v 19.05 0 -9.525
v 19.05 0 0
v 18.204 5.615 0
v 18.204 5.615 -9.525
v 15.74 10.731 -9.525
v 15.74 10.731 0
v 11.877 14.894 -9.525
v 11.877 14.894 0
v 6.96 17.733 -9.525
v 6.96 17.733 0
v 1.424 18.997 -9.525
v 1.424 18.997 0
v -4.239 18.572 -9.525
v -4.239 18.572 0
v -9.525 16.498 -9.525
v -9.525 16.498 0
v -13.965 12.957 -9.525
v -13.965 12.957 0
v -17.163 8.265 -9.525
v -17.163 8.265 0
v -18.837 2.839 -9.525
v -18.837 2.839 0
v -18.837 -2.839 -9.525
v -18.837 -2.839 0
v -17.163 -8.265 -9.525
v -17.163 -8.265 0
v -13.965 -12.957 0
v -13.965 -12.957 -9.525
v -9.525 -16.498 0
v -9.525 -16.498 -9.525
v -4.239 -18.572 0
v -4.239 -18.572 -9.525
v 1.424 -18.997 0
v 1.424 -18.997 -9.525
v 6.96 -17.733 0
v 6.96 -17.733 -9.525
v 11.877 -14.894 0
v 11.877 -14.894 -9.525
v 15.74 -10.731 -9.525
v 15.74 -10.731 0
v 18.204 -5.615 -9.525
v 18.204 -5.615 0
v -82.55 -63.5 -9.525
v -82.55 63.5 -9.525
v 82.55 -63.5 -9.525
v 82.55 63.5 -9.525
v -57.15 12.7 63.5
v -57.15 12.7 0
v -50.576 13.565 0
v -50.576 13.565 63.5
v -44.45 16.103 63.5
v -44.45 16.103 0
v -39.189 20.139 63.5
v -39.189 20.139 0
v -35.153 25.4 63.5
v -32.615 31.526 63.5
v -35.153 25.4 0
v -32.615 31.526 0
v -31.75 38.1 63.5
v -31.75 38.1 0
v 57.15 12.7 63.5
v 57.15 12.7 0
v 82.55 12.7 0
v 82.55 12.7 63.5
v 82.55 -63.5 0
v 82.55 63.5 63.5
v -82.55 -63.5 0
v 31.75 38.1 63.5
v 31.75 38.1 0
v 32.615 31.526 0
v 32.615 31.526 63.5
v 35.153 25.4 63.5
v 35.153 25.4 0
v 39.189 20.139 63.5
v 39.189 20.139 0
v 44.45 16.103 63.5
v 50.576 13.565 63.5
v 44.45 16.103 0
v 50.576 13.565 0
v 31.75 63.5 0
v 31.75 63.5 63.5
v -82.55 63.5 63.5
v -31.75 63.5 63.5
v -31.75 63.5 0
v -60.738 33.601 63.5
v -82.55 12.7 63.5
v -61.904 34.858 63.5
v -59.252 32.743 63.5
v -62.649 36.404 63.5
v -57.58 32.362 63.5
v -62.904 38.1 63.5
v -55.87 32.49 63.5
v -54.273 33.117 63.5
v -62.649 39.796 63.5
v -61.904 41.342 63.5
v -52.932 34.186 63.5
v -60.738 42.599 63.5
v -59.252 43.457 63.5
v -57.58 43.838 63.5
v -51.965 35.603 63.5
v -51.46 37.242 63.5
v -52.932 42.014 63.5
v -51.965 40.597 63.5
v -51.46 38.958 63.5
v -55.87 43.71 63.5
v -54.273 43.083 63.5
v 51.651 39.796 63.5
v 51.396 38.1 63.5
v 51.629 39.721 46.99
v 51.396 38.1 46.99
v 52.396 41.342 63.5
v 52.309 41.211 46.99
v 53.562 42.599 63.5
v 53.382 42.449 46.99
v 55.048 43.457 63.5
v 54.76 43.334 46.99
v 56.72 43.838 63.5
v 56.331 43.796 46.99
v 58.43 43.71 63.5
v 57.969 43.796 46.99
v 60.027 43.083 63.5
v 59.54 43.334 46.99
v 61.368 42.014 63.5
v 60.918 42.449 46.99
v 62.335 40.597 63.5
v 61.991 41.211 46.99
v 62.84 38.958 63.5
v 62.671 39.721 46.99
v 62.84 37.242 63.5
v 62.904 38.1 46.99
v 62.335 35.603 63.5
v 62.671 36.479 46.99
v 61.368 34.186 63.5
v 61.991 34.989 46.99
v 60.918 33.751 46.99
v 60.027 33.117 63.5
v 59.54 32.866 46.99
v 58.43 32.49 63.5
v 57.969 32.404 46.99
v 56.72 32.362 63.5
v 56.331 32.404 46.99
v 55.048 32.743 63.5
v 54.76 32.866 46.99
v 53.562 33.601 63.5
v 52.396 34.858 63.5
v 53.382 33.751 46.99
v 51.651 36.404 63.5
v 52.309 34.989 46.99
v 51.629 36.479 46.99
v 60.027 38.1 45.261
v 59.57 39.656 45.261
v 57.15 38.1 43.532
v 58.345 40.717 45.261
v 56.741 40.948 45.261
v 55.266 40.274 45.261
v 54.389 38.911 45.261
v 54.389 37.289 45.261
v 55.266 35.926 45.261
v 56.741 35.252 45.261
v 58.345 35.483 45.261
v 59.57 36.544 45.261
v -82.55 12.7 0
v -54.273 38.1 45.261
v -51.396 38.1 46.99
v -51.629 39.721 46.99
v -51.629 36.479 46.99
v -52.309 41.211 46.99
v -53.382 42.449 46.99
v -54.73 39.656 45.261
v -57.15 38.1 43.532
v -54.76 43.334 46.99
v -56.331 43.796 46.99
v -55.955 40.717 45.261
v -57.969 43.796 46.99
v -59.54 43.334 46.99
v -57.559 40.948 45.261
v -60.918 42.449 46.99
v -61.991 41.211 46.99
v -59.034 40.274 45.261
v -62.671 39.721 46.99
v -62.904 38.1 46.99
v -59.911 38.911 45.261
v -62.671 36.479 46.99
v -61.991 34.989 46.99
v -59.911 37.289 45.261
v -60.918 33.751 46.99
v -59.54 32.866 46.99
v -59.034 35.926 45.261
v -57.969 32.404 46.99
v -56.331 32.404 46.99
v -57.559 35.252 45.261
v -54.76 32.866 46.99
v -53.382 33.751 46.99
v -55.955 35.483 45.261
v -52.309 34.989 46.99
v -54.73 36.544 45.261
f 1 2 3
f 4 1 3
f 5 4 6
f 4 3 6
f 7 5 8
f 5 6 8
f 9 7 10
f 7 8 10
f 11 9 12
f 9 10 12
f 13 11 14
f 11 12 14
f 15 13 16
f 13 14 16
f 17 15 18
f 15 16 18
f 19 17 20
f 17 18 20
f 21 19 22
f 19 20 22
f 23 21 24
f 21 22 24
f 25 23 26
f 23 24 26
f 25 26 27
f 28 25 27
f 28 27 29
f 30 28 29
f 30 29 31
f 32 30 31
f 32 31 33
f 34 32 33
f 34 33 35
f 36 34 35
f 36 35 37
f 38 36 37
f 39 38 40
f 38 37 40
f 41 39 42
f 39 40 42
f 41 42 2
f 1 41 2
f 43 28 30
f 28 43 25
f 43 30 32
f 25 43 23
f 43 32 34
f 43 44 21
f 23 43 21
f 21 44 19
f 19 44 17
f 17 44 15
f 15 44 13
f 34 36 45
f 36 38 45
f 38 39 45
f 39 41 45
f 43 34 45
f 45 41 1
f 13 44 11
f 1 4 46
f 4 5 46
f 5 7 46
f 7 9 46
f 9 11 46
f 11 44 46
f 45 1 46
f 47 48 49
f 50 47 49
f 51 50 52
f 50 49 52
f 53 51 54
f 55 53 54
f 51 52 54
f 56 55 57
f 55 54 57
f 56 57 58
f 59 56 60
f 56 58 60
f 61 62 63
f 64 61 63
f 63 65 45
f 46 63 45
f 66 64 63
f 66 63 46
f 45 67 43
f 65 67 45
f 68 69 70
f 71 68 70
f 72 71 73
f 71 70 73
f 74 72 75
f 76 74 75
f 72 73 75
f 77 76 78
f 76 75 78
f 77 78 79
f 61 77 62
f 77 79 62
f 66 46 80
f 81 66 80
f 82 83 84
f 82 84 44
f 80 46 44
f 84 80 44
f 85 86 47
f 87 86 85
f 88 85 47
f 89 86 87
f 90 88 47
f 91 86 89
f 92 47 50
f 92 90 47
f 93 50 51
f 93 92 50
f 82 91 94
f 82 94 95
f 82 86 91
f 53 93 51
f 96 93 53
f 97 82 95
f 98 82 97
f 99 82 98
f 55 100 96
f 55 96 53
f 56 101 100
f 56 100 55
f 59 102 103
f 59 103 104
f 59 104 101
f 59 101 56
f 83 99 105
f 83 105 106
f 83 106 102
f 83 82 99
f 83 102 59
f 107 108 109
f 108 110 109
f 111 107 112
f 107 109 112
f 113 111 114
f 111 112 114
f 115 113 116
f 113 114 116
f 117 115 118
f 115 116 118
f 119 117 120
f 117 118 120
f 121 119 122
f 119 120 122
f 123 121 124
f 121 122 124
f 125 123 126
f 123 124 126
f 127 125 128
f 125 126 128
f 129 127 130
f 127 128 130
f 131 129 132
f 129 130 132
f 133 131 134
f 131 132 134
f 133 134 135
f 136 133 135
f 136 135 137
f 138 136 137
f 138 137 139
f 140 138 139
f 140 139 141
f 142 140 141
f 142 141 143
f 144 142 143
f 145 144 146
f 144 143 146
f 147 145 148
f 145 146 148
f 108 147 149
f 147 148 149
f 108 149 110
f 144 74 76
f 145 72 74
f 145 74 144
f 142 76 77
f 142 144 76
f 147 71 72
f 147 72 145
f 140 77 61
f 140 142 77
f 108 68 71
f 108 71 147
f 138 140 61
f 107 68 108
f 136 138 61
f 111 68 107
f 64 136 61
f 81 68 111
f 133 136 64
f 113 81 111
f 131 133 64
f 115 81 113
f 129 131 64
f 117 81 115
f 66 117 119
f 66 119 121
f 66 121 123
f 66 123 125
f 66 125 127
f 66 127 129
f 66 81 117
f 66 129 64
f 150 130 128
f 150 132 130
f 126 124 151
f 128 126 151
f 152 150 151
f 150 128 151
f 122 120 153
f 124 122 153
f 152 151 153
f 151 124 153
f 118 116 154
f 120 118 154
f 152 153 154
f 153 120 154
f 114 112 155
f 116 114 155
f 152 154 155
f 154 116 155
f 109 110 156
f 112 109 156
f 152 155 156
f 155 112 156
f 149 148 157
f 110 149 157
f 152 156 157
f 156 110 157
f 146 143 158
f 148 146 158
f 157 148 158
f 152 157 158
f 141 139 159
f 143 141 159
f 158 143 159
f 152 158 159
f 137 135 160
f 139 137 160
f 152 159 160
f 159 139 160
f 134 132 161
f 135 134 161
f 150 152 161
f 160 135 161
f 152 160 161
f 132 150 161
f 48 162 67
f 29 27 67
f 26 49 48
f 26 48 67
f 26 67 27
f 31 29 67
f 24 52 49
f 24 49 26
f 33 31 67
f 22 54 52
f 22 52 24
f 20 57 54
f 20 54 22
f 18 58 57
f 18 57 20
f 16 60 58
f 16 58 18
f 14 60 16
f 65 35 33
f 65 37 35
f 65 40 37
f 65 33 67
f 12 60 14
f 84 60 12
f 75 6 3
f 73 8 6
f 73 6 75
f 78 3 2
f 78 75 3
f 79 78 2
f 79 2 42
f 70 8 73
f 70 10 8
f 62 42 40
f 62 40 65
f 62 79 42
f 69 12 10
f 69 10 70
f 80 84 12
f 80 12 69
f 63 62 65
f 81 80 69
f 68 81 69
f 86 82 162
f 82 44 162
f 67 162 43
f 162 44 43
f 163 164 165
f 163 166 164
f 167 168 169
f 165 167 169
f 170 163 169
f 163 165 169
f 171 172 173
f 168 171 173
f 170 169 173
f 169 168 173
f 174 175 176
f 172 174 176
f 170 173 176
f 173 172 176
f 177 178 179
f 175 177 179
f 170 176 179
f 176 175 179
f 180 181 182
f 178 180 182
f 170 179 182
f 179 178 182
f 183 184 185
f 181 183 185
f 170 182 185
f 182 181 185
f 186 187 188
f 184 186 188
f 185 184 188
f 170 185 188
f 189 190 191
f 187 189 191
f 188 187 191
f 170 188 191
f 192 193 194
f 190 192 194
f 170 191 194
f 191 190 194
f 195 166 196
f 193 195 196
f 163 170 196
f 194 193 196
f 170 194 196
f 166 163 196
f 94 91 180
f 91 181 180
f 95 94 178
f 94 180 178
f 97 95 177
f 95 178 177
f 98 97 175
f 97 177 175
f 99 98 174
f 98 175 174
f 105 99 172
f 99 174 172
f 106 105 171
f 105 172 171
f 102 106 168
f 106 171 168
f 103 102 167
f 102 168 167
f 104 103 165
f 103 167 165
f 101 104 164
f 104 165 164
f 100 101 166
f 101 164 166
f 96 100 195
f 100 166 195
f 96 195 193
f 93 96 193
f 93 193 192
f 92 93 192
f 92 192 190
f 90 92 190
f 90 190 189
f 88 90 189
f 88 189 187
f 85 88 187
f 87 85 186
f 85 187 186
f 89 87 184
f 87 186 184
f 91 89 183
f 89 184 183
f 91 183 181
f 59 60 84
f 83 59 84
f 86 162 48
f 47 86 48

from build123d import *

# Parameters (mm, degrees)
F0_W     = 165.1
F0_H     = 127
F0_R     = 19.05
F1_DEPTH = 9.525
F3_DEPTH = 63.5
F5_D     = 11.50874
F5_DEPTH = 16.51
F5_TIP   = 3.4575743203


with BuildPart() as f1:
    # F0 (on Top) → F1 (new body)
    with BuildSketch(Plane.XY):
        Rectangle(F0_W, F0_H)
        Circle(F0_R, mode=Mode.SUBTRACT)
    extrude(amount=-F1_DEPTH)

    # F2 (on face) → F3 (join)
    with BuildSketch(Plane.XY):
        with BuildLine():
            Line((-31.75, 63.5), (-82.55, 63.5))
            Line((-82.55, 63.5), (-82.55, 12.7))
            Line((-82.55, 12.7), (-57.15, 12.7))
            ThreePointArc((-57.15, 12.7), (-39.1894877579, 20.1394877579), (-31.75, 38.1))
            Line((-31.75, 38.1), (-31.75, 63.5))
        make_face()
        with BuildLine():
            Line((82.55, 63.5), (31.75, 63.5))
            Line((31.75, 63.5), (31.75, 38.1))
            ThreePointArc((31.75, 38.1), (39.1894877579, 20.1394877579), (57.15, 12.7))
            Line((57.15, 12.7), (82.55, 12.7))
            Line((82.55, 12.7), (82.55, 63.5))
        make_face()
    extrude(amount=F3_DEPTH)

    # F5
    with Locations(Plane.XY.offset(63.5)):
        with Locations((57.15, 38.1), (-57.15, 38.1)):
            Hole(F5_D / 2, depth=F5_DEPTH)
            with Locations((0, 0, -(F5_DEPTH + F5_TIP / 2))):  # 118° drill point
                Cone(0, F5_D / 2, F5_TIP, mode=Mode.SUBTRACT)


solid = f1.part
